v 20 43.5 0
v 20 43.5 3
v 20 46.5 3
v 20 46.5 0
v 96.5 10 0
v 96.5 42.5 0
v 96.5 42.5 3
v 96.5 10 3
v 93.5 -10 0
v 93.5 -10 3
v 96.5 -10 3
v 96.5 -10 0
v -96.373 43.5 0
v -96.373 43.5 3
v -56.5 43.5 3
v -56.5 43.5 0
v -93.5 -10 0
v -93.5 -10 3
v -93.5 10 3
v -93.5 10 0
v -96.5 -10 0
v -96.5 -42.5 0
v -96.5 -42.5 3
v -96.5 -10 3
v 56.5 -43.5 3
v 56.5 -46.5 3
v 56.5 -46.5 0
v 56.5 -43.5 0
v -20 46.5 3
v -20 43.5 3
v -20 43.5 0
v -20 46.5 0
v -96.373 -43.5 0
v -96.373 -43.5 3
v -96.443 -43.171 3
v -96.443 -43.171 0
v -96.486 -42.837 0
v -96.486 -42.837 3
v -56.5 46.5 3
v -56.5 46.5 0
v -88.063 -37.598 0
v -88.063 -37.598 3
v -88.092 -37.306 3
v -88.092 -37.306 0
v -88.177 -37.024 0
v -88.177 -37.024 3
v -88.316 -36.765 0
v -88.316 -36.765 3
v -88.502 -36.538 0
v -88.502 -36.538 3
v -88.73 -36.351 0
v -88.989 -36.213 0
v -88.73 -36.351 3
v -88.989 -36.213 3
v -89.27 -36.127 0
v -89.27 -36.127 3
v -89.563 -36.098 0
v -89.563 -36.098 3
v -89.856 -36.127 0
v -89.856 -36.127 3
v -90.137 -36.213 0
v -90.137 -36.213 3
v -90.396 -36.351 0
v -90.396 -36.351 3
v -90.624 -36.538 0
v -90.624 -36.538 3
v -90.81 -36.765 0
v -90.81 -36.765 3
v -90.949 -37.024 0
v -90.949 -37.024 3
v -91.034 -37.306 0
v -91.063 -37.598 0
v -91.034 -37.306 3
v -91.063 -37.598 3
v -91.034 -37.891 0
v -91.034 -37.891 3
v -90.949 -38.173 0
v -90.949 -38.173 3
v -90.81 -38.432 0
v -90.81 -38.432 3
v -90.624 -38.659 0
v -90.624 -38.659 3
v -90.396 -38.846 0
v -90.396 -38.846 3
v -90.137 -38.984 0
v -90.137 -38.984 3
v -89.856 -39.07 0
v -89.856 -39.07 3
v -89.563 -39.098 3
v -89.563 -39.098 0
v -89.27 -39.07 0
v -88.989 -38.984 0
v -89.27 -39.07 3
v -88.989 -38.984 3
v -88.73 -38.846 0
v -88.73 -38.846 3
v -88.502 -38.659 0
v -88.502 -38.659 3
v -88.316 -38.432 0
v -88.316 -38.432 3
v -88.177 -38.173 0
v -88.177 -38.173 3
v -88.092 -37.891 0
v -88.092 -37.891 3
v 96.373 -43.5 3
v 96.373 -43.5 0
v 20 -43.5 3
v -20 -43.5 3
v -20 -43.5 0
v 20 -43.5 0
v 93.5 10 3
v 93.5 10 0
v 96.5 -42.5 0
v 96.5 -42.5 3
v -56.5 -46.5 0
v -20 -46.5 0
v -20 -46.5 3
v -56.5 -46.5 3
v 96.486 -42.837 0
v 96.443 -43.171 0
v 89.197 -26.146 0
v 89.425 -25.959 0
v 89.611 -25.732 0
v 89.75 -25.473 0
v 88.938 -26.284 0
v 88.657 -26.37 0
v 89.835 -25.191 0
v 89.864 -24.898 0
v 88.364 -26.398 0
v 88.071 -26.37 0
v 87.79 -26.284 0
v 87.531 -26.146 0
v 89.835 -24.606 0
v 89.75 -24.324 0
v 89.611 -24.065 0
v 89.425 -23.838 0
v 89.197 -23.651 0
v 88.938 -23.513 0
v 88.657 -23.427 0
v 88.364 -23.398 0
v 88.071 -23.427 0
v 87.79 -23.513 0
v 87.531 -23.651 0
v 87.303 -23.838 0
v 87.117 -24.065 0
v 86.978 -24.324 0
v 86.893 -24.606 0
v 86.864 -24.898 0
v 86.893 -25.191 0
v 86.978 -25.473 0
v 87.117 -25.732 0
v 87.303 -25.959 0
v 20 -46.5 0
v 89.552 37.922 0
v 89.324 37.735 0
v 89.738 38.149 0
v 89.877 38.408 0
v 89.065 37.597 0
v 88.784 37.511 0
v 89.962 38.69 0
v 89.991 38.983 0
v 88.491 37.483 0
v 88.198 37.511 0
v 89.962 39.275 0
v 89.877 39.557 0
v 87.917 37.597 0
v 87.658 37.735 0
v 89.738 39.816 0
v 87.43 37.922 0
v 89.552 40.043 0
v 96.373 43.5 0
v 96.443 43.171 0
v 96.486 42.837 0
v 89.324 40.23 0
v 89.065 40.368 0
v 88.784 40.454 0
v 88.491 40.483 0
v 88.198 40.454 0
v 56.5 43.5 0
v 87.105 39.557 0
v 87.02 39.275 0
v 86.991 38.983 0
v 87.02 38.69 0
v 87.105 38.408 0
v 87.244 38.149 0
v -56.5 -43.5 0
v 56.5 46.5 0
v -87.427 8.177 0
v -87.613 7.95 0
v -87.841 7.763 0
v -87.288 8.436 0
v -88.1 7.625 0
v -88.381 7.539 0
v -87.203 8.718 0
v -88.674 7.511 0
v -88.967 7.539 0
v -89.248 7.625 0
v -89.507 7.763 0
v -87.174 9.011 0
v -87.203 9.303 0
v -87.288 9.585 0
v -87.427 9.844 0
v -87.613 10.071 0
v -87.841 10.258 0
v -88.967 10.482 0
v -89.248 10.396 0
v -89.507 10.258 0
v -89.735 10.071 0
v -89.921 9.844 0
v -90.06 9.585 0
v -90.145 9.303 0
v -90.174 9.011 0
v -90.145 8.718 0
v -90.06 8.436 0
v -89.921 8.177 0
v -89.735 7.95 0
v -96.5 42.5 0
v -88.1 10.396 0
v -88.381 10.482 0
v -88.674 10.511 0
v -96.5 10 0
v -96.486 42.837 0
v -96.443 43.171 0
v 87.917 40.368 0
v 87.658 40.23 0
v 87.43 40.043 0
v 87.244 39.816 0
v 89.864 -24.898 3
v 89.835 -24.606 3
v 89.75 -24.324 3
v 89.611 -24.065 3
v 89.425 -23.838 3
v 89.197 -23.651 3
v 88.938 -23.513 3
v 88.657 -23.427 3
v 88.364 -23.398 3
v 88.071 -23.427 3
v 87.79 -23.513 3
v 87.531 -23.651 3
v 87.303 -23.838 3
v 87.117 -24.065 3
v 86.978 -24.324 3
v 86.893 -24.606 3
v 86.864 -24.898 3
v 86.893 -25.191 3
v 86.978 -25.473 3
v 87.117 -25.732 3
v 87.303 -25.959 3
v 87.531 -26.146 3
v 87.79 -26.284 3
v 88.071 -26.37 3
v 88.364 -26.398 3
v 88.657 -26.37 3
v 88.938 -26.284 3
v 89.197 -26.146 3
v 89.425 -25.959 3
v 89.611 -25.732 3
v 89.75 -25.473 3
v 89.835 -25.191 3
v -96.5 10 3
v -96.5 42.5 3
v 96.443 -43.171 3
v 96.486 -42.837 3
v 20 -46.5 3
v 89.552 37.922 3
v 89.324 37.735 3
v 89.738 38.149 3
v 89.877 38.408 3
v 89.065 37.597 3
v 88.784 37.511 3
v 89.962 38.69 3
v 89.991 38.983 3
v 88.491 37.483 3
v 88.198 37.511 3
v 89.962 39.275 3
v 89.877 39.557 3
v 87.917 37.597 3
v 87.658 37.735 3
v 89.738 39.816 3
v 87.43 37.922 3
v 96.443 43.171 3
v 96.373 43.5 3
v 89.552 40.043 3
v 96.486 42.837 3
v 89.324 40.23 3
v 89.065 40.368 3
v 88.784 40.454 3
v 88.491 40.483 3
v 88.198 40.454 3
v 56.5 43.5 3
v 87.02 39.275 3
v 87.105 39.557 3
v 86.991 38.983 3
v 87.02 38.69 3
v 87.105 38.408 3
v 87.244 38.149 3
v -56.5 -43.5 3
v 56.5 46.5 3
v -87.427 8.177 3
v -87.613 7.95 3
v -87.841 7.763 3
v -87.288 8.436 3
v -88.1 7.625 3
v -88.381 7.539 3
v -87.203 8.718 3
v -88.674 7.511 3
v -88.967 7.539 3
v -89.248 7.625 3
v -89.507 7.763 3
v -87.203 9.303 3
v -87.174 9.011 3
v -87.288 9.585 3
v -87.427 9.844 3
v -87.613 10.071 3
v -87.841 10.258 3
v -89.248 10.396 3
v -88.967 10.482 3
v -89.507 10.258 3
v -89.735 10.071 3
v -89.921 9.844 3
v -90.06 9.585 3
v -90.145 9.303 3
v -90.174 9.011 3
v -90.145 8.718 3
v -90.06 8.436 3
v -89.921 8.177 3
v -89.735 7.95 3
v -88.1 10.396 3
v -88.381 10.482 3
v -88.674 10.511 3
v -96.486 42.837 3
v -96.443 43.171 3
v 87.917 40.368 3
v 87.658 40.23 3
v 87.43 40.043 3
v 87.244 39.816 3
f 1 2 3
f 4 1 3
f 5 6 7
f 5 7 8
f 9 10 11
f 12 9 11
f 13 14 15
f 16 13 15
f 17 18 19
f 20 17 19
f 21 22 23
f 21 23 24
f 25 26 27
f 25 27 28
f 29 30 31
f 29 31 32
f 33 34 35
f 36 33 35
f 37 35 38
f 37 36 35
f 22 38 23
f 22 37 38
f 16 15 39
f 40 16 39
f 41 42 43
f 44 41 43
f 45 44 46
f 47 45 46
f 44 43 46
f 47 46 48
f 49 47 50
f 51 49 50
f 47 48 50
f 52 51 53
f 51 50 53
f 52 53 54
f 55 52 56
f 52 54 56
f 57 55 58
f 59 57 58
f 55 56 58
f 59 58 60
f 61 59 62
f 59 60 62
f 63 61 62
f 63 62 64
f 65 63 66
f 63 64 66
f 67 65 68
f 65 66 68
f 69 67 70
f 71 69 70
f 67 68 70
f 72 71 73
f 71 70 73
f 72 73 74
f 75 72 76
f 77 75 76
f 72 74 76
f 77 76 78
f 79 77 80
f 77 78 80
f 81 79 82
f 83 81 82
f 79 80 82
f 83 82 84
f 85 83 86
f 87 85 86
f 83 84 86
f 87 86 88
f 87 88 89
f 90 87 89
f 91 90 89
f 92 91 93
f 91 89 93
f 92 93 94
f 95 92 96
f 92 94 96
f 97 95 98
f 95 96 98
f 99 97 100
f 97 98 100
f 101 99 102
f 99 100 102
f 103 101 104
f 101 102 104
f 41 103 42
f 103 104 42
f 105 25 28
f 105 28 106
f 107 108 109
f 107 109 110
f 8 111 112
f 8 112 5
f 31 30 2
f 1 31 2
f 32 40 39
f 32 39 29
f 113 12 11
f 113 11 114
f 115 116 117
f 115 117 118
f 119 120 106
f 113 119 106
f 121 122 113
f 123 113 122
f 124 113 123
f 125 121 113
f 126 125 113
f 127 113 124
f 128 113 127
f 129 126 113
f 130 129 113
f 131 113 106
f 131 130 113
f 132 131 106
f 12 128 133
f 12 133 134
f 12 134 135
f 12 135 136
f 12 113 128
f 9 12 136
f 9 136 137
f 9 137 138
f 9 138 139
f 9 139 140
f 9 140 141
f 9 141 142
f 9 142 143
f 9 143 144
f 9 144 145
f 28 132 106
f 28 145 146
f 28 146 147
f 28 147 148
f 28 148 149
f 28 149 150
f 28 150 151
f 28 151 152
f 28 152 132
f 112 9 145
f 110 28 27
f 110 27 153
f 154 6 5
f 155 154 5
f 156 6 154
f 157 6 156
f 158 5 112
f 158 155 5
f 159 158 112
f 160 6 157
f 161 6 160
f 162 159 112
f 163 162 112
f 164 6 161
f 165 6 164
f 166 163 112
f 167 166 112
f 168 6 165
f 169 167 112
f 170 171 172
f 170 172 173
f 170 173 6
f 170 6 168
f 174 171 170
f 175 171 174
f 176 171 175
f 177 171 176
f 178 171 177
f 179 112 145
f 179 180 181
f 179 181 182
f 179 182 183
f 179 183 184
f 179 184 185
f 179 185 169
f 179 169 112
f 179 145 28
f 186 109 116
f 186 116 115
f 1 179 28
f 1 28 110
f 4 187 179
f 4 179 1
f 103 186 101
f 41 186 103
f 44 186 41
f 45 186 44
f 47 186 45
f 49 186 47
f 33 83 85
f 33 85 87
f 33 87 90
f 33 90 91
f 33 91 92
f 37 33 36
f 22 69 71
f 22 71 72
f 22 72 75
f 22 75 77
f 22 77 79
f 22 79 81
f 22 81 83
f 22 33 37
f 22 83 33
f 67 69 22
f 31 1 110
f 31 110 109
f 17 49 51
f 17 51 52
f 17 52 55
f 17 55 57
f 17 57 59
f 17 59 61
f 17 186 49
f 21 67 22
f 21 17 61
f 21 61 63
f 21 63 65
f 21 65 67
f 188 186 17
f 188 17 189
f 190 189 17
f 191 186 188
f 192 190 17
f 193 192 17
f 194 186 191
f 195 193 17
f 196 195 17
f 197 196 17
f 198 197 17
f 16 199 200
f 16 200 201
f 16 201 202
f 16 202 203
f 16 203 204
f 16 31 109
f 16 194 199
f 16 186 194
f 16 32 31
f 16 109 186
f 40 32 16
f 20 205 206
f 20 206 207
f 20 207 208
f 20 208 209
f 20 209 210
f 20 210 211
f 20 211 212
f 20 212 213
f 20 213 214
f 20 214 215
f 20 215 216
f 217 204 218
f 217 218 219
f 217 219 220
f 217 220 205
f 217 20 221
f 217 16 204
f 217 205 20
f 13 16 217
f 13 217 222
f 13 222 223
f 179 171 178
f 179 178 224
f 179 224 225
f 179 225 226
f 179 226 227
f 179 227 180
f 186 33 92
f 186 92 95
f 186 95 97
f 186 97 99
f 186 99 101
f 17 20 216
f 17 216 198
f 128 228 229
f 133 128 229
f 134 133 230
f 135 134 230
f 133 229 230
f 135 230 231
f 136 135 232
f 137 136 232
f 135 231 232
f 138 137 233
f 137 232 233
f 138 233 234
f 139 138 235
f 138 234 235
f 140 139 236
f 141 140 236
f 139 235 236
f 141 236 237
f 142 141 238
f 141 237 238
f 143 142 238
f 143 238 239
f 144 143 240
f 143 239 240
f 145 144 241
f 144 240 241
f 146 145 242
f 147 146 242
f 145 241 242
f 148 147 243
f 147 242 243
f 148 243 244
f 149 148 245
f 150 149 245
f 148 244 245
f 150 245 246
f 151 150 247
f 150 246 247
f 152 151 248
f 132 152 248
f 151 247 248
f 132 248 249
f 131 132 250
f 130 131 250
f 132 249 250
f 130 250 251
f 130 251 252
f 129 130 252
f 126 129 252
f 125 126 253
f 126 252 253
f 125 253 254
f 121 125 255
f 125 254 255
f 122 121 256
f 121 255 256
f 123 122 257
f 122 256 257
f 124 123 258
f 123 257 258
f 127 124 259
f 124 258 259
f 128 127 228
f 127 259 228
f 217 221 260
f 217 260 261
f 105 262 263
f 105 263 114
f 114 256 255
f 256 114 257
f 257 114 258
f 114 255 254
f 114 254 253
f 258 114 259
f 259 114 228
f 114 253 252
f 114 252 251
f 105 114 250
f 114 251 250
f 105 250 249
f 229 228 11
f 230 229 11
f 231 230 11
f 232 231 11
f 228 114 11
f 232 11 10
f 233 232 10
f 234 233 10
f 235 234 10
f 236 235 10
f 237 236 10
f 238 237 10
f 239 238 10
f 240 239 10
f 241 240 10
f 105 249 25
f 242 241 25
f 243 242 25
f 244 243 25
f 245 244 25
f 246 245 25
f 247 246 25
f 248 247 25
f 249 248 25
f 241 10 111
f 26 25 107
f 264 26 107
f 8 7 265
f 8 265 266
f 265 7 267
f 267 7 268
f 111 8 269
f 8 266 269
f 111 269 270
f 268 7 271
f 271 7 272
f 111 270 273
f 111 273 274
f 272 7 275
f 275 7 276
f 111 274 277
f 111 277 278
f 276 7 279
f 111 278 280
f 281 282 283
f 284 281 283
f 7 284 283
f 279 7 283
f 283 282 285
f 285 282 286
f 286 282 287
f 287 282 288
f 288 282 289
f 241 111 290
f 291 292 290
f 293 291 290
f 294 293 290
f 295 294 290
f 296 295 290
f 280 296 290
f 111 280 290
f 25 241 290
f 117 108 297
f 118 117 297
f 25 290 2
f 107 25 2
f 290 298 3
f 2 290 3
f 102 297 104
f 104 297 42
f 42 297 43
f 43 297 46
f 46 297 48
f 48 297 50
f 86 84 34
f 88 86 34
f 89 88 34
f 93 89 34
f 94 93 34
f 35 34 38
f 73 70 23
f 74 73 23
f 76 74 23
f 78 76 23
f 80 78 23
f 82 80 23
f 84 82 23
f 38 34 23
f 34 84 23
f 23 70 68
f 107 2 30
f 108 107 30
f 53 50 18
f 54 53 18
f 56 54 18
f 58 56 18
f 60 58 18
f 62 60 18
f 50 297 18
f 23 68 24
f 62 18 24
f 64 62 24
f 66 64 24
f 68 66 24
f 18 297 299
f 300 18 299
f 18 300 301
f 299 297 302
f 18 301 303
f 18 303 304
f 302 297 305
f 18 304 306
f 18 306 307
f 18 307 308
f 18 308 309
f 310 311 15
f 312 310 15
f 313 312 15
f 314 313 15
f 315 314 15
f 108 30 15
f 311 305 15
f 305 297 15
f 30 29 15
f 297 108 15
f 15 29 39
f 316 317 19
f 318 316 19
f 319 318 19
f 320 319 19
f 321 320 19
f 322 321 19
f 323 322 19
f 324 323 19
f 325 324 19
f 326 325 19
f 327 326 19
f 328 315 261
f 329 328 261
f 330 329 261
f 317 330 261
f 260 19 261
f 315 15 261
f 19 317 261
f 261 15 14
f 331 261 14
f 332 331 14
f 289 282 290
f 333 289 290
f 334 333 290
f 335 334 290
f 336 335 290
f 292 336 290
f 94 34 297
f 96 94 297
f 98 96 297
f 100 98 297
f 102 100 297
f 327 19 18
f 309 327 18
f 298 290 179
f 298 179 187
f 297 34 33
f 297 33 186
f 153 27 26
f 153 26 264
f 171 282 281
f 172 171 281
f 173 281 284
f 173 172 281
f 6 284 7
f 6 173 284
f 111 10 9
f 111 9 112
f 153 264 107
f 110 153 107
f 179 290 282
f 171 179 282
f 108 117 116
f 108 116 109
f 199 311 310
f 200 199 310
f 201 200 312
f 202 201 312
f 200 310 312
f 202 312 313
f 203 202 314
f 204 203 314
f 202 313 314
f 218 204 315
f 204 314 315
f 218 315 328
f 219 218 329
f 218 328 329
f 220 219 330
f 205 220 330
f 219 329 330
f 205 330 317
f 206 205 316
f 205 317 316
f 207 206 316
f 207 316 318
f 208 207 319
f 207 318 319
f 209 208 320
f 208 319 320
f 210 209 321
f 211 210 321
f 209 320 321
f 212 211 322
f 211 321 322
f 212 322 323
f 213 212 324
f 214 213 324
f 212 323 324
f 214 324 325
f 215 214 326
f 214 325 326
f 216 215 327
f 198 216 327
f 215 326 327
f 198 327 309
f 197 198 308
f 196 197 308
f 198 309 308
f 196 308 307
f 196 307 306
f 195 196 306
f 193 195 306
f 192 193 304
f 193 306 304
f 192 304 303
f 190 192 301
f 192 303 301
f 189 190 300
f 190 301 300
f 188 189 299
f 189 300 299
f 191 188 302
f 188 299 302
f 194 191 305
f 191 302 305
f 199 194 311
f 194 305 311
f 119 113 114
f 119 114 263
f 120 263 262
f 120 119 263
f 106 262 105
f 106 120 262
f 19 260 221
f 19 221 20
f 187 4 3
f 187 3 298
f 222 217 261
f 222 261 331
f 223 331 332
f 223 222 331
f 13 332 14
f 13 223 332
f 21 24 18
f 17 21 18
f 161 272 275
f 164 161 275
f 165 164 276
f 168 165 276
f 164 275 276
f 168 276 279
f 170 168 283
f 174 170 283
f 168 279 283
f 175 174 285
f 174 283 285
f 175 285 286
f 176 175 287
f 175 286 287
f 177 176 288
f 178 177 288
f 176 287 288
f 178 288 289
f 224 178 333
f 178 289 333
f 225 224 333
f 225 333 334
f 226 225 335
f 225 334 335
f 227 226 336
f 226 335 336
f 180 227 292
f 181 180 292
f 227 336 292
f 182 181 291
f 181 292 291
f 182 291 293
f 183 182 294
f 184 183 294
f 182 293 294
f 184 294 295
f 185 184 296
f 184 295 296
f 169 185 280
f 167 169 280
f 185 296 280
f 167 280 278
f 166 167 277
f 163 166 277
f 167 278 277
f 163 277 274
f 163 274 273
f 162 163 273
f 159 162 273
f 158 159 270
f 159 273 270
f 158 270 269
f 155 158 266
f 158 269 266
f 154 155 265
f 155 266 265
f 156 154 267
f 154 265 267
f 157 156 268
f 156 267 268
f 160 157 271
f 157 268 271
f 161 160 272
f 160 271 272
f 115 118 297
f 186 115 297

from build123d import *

# Parameters (mm, degrees)
BOSS_EXTRUDE2_DEPTH = 3
SKETCH3_R           = 1.5
SKETCH3_W           = 3
SKETCH3_H           = 20
SKETCH3_W_2         = 40
SKETCH3_H_2         = 3
CUT_EXTRUDE1_DEPTH  = 3


with BuildPart() as part:
    # Sketch1 → Boss-Extrude2 (new body)
    with BuildSketch(Plane.XY):
        with BuildLine():
            Line((-92.5, 46.5), (92.5, 46.5))
            ThreePointArc((92.5, 46.5), (95.328427125, 45.328427125), (96.5, 42.5))
            Line((96.5, 42.5), (96.5, -42.5))
            ThreePointArc((96.5, -42.5), (95.328427125, -45.328427125), (92.5, -46.5))
            Line((92.5, -46.5), (-92.5, -46.5))
            ThreePointArc((-92.5, -46.5), (-95.328427125, -45.328427125), (-96.5, -42.5))
            Line((-96.5, -42.5), (-96.5, 42.5))
            ThreePointArc((-96.5, 42.5), (-95.328427125, 45.328427125), (-92.5, 46.5))
        make_face()
    extrude(amount=BOSS_EXTRUDE2_DEPTH)

    # Sketch3 → Cut-Extrude1 (cut)
    with BuildSketch(Plane.XY.offset(3)):
        with Locations((-88.674, 9.010523044)):
            Circle(SKETCH3_R)
        with Locations((-89.563, -37.598476956)):
            Circle(SKETCH3_R)
        with Locations((88.364, -24.898476956)):
            Circle(SKETCH3_R)
        with Locations((88.491, 38.982523044)):
            Circle(SKETCH3_R)
        with Locations((-95, 0)):
            Rectangle(SKETCH3_W, SKETCH3_H)
        with Locations((95, 0)):
            Rectangle(SKETCH3_W, SKETCH3_H)
        with Locations((76.5, 45)):
            Rectangle(SKETCH3_W_2, SKETCH3_H_2)
        with Locations((-76.5, 45)):
            Rectangle(SKETCH3_W_2, SKETCH3_H_2)
        with Locations((76.5, -45)):
            Rectangle(SKETCH3_W_2, SKETCH3_H_2)
        with Locations((0, 45)):
            Rectangle(SKETCH3_W_2, SKETCH3_H_2)
        with Locations((0, -45)):
            Rectangle(SKETCH3_W_2, SKETCH3_H_2)
        with Locations((-76.5, -45)):
            Rectangle(SKETCH3_W_2, SKETCH3_H_2)
    extrude(amount=-CUT_EXTRUDE1_DEPTH, mode=Mode.SUBTRACT)


solid = part.part
